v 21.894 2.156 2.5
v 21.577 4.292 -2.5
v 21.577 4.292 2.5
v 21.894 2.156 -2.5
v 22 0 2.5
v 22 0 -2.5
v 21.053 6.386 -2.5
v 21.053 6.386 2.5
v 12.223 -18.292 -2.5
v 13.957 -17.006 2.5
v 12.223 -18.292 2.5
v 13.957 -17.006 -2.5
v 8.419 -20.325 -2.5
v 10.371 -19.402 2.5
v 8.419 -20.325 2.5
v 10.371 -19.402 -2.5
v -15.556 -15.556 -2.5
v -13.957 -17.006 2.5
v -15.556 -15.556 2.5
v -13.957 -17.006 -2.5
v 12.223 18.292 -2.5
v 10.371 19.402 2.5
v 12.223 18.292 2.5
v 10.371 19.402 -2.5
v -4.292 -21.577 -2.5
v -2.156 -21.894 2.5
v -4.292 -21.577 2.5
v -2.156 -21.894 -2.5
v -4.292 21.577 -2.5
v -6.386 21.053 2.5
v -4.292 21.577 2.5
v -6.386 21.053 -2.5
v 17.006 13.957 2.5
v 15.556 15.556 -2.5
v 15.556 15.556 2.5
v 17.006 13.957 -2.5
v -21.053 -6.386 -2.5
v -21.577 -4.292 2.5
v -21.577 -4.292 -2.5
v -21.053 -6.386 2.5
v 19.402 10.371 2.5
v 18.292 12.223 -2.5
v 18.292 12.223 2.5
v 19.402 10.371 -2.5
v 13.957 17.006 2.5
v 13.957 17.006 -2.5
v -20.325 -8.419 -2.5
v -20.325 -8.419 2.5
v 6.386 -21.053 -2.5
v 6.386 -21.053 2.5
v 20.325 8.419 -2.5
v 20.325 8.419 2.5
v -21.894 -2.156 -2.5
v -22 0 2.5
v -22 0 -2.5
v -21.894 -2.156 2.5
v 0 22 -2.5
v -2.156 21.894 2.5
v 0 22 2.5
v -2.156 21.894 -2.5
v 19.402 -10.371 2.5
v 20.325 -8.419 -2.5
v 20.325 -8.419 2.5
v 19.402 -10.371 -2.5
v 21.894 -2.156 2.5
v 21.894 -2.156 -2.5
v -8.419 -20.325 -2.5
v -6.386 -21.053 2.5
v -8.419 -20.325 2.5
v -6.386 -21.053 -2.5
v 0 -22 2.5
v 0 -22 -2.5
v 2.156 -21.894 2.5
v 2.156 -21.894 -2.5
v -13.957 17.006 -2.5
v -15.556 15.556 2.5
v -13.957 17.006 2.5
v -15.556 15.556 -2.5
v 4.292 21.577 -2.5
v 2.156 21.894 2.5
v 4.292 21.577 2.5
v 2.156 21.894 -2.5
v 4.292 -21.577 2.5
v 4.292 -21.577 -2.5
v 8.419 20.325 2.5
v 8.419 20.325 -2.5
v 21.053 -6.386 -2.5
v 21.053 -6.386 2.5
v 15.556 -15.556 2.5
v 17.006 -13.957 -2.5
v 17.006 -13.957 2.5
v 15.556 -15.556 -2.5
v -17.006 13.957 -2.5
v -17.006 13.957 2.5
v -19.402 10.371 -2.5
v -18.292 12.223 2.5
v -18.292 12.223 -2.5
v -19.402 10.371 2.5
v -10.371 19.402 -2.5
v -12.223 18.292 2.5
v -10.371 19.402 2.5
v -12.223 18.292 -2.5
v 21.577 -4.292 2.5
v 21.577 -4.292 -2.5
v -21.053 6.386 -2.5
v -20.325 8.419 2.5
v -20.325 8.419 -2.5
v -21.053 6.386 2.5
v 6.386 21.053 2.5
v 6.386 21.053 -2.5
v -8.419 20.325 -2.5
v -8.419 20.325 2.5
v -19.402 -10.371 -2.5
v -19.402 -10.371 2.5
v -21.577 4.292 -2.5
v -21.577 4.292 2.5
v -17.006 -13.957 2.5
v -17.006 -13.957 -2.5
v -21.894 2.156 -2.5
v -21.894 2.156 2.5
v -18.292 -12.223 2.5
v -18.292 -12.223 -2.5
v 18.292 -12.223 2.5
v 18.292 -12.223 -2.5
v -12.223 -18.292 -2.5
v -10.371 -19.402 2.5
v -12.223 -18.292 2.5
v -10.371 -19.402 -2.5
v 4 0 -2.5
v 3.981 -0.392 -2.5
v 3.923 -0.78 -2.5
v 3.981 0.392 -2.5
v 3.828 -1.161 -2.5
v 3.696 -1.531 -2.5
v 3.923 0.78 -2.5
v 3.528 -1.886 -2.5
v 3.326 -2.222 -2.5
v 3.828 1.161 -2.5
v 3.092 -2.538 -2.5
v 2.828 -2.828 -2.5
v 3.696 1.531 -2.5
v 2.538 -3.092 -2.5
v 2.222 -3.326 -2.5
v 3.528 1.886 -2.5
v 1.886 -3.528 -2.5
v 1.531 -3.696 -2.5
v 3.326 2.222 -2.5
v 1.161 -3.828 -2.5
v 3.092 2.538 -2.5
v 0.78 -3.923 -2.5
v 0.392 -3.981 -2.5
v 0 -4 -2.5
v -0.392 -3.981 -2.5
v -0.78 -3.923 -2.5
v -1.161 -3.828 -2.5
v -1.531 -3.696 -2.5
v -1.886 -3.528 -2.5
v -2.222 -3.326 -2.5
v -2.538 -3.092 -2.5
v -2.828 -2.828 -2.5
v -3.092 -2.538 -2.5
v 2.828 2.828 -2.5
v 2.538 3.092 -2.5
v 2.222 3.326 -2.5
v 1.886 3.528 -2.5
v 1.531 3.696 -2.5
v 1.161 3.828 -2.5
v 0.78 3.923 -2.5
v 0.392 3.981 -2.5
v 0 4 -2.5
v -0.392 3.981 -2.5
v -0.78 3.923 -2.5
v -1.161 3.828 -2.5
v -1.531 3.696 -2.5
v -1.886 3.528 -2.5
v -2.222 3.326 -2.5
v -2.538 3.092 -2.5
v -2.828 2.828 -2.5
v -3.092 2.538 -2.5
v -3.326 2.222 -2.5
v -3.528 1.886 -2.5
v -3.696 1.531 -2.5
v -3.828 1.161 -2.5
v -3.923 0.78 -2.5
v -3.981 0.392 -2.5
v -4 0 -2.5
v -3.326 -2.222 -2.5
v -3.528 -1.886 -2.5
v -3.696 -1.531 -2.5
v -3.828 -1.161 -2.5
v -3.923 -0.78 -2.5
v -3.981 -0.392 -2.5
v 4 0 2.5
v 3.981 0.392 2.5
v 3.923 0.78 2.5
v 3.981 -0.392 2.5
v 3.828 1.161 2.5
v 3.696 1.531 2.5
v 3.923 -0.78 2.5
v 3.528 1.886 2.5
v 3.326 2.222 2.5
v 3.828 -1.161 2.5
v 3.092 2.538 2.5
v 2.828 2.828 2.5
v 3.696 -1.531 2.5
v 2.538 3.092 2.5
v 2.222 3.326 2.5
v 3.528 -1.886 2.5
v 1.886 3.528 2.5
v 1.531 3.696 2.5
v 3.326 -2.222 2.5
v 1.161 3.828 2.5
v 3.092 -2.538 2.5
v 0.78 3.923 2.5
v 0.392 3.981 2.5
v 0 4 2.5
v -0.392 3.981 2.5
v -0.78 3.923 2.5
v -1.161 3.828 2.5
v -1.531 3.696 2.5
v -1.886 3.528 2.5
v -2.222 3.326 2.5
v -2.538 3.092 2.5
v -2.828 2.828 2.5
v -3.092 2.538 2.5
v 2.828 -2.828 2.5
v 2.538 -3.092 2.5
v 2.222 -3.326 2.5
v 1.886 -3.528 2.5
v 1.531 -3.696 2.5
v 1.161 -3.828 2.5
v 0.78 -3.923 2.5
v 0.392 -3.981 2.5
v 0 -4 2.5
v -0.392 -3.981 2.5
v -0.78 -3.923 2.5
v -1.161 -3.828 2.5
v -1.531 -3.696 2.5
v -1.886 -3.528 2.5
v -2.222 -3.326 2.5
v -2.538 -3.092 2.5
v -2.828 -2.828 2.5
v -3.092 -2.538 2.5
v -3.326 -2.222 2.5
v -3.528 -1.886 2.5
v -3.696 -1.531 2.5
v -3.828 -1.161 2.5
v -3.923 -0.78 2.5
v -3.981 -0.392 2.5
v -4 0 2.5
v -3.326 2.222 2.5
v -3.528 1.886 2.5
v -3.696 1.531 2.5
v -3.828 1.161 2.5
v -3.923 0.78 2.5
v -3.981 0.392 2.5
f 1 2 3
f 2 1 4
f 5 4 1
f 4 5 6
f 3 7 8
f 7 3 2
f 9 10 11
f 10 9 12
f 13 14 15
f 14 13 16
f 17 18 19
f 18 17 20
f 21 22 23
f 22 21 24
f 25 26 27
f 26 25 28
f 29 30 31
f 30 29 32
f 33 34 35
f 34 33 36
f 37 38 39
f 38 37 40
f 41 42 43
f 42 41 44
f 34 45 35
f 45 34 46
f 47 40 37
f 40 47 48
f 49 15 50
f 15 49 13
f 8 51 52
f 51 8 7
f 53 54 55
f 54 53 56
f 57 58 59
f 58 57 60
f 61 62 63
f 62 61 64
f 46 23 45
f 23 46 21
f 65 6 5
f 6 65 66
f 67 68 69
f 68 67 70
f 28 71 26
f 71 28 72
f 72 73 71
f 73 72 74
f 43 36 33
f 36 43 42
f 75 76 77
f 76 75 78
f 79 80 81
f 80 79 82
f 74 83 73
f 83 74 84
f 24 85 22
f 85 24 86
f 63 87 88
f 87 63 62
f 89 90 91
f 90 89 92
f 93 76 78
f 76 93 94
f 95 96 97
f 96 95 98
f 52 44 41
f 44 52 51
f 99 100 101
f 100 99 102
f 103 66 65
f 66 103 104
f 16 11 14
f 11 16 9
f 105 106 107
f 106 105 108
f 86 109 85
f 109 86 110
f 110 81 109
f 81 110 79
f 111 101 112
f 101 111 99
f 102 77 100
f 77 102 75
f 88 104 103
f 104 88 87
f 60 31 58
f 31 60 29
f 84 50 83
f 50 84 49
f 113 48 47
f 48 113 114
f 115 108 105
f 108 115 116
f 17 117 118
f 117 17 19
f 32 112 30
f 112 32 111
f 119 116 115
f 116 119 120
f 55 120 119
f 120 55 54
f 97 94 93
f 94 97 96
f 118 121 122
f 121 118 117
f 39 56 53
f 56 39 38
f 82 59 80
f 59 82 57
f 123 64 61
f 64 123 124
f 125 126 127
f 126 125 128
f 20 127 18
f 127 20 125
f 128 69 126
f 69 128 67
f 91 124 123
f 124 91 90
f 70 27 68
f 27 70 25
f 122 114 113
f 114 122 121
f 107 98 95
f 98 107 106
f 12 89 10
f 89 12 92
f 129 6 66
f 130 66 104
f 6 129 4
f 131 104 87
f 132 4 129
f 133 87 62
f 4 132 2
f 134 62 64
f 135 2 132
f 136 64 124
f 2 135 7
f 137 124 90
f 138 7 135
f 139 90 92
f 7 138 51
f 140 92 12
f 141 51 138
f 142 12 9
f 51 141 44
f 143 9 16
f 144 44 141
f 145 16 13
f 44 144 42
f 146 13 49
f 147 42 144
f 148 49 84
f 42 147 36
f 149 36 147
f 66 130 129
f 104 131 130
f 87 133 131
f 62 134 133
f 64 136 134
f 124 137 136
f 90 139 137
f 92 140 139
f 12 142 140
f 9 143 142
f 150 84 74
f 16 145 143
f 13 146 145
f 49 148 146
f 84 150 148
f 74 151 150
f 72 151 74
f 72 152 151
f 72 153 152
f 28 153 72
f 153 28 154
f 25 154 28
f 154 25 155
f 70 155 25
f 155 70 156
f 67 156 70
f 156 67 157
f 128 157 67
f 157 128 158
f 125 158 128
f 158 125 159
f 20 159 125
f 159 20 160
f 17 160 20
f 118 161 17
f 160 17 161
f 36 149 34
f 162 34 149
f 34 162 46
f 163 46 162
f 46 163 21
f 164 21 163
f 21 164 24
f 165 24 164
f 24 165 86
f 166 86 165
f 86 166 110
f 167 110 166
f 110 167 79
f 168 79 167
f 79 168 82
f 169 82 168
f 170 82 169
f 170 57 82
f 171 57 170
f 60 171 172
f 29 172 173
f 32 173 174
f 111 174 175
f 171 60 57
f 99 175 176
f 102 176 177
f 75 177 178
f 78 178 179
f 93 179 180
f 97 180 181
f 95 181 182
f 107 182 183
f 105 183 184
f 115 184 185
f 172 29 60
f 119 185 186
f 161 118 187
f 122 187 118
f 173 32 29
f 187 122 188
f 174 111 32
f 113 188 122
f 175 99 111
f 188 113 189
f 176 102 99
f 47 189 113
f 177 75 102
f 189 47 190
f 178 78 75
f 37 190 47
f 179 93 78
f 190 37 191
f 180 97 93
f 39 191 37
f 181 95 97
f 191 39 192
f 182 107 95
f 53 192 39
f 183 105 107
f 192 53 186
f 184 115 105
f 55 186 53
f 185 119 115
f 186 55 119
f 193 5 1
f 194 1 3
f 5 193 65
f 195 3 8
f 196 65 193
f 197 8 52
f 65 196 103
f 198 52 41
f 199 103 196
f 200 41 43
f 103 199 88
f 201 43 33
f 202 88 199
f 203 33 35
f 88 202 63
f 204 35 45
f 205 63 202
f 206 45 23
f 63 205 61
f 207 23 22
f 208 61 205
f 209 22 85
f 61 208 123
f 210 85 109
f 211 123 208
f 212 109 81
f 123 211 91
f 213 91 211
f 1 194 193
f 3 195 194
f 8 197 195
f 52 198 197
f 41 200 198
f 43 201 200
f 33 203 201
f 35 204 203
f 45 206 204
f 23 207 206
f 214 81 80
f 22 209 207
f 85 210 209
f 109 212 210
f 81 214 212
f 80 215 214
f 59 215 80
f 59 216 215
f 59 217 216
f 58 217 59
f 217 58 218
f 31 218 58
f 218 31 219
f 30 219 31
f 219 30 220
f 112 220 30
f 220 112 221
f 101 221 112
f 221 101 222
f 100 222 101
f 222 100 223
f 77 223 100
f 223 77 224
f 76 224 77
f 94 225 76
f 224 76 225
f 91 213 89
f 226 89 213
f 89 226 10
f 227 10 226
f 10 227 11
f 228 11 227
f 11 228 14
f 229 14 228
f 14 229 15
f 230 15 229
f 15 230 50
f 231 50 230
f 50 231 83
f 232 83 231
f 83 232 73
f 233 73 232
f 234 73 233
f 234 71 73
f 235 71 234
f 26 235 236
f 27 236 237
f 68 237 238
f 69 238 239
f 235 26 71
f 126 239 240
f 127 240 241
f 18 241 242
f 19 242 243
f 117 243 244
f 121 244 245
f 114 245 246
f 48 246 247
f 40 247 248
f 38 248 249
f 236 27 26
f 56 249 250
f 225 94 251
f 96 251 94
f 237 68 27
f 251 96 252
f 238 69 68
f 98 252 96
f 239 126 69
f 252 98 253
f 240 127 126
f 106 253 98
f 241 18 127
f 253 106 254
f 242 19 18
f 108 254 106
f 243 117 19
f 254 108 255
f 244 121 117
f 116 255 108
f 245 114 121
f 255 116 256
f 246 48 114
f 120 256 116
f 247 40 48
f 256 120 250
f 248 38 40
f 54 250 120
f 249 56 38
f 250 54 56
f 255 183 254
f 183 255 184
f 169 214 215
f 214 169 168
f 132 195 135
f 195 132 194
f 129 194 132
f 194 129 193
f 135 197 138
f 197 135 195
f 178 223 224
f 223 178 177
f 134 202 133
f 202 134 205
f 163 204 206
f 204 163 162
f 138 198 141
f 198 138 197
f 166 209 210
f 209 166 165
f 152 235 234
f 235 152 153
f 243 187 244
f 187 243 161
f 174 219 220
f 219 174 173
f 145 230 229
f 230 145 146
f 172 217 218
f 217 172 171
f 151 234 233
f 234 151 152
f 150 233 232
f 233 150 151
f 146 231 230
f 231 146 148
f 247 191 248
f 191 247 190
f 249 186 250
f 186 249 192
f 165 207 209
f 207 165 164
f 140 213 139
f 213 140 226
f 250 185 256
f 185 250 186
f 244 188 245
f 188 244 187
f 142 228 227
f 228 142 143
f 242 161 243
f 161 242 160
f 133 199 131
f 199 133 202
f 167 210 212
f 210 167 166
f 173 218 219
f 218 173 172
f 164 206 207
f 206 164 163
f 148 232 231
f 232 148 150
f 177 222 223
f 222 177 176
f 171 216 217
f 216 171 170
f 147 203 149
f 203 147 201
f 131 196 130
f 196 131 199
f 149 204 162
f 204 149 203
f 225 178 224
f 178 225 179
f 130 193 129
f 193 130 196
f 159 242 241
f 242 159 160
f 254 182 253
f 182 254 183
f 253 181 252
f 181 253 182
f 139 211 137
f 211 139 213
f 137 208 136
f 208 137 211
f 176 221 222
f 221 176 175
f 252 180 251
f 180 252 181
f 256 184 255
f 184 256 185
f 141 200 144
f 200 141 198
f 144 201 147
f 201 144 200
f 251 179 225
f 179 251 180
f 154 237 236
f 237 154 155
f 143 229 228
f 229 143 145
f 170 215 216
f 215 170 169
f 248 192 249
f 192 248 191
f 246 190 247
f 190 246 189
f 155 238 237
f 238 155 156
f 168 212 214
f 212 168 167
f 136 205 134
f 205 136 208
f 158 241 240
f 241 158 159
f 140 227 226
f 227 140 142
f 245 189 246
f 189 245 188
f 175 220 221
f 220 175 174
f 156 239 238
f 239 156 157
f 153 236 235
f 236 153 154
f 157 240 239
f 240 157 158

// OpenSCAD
// Parametric Gear
// A simple spur gear generator

/* [Gear Parameters] */
// Number of teeth
teeth = 20; // [6:1:100]
// Module (tooth size)
module_size = 2; // [0.5:0.5:10]
// Pressure angle in degrees
pressure_angle = 20; // [14.5, 20, 25]
// Gear thickness
thickness = 5; // [1:50]

/* [Bore] */
// Center bore diameter
bore_diameter = 8; // [0:0.5:50]
// Number of spokes (0 for solid)
spokes = 0; // [0:1:8]

/* [Quality] */
// Rendering resolution
quality = "medium"; // [low, medium, high]

fn = quality == "high" ? 128 : quality == "medium" ? 64 : 32;

pitch_radius = teeth * module_size / 2;
outer_radius = pitch_radius + module_size;

difference() {
    // Gear body
    cylinder(r=outer_radius, h=thickness, $fn=fn, center=true);

    // Bore
    if (bore_diameter > 0) {
        cylinder(d=bore_diameter, h=thickness + 1, $fn=fn, center=true);
    }
}
